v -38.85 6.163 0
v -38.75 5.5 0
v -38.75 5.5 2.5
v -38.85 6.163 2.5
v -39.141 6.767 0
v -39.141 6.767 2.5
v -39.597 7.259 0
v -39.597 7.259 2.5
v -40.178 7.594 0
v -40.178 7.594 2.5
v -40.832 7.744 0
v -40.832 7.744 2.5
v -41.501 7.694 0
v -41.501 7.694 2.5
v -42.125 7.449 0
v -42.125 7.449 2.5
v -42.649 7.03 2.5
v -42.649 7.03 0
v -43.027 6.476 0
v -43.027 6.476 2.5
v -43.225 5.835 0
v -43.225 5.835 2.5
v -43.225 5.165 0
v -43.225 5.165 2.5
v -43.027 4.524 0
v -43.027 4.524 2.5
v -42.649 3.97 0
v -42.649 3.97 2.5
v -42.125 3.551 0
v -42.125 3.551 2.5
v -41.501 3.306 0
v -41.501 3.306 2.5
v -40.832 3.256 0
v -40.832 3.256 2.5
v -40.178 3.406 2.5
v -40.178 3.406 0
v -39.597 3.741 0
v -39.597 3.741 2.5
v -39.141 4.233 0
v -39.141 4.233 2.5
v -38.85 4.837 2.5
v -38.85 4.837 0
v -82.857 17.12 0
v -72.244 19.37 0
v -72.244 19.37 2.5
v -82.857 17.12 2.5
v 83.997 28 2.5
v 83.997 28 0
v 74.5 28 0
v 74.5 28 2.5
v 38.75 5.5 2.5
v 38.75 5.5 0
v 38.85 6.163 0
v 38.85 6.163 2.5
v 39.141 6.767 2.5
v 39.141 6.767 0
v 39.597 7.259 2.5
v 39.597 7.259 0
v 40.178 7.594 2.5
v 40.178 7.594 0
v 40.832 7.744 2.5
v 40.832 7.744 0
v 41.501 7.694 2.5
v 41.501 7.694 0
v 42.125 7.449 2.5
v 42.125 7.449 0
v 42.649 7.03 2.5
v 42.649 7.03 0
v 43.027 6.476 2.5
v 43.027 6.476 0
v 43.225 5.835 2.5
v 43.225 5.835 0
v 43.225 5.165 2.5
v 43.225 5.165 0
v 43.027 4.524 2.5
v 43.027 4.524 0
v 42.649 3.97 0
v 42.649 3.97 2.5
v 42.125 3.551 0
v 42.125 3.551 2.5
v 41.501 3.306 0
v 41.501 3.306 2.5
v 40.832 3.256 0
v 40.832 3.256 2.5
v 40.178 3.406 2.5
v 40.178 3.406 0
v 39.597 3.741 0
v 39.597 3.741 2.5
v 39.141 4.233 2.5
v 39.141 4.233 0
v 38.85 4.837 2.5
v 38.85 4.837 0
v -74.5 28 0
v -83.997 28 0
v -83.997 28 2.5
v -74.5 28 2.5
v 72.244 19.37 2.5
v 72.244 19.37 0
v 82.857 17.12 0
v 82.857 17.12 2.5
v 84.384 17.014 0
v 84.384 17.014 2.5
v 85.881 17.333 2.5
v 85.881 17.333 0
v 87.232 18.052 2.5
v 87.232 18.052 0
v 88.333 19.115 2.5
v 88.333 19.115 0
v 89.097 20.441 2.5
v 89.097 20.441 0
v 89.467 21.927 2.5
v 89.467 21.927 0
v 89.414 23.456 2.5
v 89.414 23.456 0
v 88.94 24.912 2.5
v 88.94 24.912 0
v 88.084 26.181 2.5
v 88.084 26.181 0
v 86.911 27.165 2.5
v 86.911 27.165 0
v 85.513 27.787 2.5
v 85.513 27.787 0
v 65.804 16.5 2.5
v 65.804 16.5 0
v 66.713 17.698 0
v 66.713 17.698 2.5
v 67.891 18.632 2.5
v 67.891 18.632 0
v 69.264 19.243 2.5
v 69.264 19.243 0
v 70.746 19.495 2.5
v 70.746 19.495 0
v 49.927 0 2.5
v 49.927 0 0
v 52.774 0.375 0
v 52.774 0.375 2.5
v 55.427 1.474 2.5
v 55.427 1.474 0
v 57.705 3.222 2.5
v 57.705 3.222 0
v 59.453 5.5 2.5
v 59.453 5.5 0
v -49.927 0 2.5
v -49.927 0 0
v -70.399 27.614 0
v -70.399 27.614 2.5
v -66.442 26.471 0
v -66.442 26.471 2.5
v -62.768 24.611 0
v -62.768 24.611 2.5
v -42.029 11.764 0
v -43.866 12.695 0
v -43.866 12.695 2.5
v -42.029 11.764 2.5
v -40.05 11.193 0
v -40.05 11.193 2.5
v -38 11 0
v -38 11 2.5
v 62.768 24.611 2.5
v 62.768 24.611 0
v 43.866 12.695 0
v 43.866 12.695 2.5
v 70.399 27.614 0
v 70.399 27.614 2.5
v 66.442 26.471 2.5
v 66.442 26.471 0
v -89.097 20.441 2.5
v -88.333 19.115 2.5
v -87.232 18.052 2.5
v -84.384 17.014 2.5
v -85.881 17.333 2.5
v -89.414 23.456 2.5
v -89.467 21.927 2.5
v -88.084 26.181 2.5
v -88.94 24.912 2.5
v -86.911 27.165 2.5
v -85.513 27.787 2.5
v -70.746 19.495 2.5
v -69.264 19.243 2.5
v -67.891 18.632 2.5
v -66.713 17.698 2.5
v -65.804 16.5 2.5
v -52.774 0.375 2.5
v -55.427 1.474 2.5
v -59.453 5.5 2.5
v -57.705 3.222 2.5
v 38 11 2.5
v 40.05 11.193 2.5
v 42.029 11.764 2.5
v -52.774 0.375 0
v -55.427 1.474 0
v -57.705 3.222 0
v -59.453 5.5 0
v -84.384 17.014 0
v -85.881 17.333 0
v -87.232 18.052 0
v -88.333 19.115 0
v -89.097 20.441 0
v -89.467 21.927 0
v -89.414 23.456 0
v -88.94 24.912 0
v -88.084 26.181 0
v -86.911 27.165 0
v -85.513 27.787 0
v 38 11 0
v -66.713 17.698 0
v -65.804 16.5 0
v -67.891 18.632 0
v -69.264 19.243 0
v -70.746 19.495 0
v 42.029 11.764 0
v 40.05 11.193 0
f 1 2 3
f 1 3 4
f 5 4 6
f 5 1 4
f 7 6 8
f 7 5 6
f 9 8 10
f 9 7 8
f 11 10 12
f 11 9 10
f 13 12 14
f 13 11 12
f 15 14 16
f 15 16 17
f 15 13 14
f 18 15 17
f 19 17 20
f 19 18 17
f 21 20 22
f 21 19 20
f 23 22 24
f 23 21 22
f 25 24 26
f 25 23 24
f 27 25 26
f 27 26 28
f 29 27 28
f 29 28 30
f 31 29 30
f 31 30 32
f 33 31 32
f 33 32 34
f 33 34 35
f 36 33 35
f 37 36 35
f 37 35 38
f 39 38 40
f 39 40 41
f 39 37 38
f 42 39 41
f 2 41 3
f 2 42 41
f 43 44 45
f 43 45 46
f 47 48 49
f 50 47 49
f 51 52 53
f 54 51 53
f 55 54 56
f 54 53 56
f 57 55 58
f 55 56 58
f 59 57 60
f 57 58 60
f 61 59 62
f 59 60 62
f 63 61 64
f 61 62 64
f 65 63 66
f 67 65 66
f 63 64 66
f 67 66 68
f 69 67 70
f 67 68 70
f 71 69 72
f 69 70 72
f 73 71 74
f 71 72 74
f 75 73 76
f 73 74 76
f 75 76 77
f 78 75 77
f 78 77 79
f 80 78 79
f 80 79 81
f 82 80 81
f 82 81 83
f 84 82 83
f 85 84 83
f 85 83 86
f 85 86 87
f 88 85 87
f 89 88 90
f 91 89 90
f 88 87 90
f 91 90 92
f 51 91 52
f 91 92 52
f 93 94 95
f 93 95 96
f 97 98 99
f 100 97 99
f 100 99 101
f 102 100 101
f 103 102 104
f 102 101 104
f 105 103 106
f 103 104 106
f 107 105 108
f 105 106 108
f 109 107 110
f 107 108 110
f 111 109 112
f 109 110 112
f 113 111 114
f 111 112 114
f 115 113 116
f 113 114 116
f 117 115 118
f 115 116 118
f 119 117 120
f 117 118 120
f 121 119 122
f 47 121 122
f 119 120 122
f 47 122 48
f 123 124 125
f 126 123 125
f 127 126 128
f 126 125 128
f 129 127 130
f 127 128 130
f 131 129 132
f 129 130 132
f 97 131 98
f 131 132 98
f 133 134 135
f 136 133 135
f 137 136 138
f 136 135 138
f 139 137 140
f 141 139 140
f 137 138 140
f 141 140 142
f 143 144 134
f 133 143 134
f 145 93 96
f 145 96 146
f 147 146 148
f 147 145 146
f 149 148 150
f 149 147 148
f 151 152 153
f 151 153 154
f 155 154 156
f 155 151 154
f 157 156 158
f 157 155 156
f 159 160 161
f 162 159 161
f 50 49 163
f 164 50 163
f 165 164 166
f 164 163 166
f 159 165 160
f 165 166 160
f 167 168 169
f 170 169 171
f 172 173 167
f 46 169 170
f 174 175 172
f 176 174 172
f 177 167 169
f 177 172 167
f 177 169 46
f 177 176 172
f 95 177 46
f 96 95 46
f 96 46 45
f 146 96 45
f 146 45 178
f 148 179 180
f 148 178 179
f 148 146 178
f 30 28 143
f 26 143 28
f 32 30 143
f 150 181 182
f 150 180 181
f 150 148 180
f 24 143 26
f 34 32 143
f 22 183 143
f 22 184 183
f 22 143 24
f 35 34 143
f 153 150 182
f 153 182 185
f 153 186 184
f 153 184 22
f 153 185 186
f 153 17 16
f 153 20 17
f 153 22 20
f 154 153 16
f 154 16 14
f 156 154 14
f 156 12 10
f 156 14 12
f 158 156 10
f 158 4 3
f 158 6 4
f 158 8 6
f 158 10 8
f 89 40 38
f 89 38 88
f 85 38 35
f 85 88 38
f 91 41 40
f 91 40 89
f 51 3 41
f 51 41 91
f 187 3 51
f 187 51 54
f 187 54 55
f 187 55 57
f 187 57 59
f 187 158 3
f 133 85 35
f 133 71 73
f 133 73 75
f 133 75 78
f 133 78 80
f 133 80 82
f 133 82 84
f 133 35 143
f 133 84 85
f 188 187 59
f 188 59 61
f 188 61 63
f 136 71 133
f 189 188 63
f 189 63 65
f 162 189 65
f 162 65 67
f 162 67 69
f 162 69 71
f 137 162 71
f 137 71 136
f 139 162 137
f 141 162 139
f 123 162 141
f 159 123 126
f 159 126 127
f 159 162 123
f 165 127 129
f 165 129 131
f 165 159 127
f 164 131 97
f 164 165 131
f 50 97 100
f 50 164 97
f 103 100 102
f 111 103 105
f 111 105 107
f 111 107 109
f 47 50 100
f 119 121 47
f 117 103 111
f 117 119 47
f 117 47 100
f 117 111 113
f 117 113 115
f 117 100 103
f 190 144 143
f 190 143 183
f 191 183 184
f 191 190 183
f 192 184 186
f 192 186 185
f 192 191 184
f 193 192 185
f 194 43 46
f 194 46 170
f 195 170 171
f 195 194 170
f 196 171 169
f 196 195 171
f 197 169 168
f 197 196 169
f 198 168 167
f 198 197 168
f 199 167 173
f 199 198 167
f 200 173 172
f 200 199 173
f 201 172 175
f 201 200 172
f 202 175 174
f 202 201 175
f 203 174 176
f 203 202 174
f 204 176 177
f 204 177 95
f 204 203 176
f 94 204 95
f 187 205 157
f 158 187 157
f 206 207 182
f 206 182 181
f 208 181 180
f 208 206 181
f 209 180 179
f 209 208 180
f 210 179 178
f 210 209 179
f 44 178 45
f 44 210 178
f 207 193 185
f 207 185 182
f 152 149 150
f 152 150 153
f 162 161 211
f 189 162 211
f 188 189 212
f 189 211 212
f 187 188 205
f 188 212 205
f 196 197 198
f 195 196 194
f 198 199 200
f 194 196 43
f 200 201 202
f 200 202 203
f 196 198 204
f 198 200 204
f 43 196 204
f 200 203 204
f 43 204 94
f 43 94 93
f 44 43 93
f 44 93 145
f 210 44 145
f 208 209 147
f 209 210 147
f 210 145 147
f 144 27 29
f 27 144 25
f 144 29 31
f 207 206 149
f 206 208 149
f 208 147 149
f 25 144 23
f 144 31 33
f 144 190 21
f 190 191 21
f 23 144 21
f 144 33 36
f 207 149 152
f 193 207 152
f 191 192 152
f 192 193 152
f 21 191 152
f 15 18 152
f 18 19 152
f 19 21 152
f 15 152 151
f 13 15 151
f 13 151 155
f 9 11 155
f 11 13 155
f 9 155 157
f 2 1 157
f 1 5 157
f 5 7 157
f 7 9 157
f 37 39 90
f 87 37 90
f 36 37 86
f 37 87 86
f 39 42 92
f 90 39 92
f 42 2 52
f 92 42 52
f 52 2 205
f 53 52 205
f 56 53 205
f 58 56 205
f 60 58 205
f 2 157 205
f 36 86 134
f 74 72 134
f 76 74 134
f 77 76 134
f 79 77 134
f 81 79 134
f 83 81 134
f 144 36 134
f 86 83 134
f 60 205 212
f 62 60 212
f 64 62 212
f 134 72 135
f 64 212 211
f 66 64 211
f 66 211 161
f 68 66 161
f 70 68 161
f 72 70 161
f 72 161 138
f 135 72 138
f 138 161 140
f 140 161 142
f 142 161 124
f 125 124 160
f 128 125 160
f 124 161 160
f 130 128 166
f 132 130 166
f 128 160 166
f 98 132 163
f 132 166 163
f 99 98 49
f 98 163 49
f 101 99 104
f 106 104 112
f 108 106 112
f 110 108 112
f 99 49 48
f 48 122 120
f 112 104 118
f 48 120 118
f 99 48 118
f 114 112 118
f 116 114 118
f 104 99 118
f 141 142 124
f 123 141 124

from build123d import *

# Parameters (mm, degrees)
SKETCH1_R           = 2.25
BOSS_EXTRUDE1_DEPTH = 2.5


with BuildPart() as part:
    # Sketch1 → Boss-Extrude1 (new body)
    with BuildSketch(Plane.XY):
        with BuildLine():
            Line((0, 0), (-49.926715175, 0))
            ThreePointArc((-49.926715175, 0), (-55.426715175, 1.473720558), (-59.452994616, 5.5))
            Line((-59.452994616, 5.5), (-65.803847577, 16.5))
            ThreePointArc((-65.803847577, 16.5), (-68.558161164, 18.980640756), (-72.244431158, 19.369530739))
            Line((-72.244431158, 19.369530739), (-82.856553967, 17.119596823))
            ThreePointArc((-82.856553967, 17.119596823), (-89.467301609, 21.926509579), (-83.997282528, 28))
            Line((-83.997282528, 28), (-74.5, 28))
            ThreePointArc((-74.5, 28), (-68.39391207, 27.135649746), (-62.767624018, 24.61051729))
            Line((-62.767624018, 24.61051729), (-43.866187991, 12.694741355))
            ThreePointArc((-43.866187991, 12.694741355), (-41.053043965, 11.432175127), (-38, 11))
            Line((-38, 11), (0, 11))
            Line((0, 11), (0, 0))
        make_face()
        with Locations((-41, 5.5)):
            Circle(SKETCH1_R, mode=Mode.SUBTRACT)
    extrude(amount=BOSS_EXTRUDE1_DEPTH)

    # Mirror1: part across plane


with BuildPart() as part_1:
    add(part.part)
    add(part.part.mirror(Plane(origin=(0, 0, 2.5), x_dir=(0, 0, 1), z_dir=(-1, 0, 0))))


solid = part_1.part
